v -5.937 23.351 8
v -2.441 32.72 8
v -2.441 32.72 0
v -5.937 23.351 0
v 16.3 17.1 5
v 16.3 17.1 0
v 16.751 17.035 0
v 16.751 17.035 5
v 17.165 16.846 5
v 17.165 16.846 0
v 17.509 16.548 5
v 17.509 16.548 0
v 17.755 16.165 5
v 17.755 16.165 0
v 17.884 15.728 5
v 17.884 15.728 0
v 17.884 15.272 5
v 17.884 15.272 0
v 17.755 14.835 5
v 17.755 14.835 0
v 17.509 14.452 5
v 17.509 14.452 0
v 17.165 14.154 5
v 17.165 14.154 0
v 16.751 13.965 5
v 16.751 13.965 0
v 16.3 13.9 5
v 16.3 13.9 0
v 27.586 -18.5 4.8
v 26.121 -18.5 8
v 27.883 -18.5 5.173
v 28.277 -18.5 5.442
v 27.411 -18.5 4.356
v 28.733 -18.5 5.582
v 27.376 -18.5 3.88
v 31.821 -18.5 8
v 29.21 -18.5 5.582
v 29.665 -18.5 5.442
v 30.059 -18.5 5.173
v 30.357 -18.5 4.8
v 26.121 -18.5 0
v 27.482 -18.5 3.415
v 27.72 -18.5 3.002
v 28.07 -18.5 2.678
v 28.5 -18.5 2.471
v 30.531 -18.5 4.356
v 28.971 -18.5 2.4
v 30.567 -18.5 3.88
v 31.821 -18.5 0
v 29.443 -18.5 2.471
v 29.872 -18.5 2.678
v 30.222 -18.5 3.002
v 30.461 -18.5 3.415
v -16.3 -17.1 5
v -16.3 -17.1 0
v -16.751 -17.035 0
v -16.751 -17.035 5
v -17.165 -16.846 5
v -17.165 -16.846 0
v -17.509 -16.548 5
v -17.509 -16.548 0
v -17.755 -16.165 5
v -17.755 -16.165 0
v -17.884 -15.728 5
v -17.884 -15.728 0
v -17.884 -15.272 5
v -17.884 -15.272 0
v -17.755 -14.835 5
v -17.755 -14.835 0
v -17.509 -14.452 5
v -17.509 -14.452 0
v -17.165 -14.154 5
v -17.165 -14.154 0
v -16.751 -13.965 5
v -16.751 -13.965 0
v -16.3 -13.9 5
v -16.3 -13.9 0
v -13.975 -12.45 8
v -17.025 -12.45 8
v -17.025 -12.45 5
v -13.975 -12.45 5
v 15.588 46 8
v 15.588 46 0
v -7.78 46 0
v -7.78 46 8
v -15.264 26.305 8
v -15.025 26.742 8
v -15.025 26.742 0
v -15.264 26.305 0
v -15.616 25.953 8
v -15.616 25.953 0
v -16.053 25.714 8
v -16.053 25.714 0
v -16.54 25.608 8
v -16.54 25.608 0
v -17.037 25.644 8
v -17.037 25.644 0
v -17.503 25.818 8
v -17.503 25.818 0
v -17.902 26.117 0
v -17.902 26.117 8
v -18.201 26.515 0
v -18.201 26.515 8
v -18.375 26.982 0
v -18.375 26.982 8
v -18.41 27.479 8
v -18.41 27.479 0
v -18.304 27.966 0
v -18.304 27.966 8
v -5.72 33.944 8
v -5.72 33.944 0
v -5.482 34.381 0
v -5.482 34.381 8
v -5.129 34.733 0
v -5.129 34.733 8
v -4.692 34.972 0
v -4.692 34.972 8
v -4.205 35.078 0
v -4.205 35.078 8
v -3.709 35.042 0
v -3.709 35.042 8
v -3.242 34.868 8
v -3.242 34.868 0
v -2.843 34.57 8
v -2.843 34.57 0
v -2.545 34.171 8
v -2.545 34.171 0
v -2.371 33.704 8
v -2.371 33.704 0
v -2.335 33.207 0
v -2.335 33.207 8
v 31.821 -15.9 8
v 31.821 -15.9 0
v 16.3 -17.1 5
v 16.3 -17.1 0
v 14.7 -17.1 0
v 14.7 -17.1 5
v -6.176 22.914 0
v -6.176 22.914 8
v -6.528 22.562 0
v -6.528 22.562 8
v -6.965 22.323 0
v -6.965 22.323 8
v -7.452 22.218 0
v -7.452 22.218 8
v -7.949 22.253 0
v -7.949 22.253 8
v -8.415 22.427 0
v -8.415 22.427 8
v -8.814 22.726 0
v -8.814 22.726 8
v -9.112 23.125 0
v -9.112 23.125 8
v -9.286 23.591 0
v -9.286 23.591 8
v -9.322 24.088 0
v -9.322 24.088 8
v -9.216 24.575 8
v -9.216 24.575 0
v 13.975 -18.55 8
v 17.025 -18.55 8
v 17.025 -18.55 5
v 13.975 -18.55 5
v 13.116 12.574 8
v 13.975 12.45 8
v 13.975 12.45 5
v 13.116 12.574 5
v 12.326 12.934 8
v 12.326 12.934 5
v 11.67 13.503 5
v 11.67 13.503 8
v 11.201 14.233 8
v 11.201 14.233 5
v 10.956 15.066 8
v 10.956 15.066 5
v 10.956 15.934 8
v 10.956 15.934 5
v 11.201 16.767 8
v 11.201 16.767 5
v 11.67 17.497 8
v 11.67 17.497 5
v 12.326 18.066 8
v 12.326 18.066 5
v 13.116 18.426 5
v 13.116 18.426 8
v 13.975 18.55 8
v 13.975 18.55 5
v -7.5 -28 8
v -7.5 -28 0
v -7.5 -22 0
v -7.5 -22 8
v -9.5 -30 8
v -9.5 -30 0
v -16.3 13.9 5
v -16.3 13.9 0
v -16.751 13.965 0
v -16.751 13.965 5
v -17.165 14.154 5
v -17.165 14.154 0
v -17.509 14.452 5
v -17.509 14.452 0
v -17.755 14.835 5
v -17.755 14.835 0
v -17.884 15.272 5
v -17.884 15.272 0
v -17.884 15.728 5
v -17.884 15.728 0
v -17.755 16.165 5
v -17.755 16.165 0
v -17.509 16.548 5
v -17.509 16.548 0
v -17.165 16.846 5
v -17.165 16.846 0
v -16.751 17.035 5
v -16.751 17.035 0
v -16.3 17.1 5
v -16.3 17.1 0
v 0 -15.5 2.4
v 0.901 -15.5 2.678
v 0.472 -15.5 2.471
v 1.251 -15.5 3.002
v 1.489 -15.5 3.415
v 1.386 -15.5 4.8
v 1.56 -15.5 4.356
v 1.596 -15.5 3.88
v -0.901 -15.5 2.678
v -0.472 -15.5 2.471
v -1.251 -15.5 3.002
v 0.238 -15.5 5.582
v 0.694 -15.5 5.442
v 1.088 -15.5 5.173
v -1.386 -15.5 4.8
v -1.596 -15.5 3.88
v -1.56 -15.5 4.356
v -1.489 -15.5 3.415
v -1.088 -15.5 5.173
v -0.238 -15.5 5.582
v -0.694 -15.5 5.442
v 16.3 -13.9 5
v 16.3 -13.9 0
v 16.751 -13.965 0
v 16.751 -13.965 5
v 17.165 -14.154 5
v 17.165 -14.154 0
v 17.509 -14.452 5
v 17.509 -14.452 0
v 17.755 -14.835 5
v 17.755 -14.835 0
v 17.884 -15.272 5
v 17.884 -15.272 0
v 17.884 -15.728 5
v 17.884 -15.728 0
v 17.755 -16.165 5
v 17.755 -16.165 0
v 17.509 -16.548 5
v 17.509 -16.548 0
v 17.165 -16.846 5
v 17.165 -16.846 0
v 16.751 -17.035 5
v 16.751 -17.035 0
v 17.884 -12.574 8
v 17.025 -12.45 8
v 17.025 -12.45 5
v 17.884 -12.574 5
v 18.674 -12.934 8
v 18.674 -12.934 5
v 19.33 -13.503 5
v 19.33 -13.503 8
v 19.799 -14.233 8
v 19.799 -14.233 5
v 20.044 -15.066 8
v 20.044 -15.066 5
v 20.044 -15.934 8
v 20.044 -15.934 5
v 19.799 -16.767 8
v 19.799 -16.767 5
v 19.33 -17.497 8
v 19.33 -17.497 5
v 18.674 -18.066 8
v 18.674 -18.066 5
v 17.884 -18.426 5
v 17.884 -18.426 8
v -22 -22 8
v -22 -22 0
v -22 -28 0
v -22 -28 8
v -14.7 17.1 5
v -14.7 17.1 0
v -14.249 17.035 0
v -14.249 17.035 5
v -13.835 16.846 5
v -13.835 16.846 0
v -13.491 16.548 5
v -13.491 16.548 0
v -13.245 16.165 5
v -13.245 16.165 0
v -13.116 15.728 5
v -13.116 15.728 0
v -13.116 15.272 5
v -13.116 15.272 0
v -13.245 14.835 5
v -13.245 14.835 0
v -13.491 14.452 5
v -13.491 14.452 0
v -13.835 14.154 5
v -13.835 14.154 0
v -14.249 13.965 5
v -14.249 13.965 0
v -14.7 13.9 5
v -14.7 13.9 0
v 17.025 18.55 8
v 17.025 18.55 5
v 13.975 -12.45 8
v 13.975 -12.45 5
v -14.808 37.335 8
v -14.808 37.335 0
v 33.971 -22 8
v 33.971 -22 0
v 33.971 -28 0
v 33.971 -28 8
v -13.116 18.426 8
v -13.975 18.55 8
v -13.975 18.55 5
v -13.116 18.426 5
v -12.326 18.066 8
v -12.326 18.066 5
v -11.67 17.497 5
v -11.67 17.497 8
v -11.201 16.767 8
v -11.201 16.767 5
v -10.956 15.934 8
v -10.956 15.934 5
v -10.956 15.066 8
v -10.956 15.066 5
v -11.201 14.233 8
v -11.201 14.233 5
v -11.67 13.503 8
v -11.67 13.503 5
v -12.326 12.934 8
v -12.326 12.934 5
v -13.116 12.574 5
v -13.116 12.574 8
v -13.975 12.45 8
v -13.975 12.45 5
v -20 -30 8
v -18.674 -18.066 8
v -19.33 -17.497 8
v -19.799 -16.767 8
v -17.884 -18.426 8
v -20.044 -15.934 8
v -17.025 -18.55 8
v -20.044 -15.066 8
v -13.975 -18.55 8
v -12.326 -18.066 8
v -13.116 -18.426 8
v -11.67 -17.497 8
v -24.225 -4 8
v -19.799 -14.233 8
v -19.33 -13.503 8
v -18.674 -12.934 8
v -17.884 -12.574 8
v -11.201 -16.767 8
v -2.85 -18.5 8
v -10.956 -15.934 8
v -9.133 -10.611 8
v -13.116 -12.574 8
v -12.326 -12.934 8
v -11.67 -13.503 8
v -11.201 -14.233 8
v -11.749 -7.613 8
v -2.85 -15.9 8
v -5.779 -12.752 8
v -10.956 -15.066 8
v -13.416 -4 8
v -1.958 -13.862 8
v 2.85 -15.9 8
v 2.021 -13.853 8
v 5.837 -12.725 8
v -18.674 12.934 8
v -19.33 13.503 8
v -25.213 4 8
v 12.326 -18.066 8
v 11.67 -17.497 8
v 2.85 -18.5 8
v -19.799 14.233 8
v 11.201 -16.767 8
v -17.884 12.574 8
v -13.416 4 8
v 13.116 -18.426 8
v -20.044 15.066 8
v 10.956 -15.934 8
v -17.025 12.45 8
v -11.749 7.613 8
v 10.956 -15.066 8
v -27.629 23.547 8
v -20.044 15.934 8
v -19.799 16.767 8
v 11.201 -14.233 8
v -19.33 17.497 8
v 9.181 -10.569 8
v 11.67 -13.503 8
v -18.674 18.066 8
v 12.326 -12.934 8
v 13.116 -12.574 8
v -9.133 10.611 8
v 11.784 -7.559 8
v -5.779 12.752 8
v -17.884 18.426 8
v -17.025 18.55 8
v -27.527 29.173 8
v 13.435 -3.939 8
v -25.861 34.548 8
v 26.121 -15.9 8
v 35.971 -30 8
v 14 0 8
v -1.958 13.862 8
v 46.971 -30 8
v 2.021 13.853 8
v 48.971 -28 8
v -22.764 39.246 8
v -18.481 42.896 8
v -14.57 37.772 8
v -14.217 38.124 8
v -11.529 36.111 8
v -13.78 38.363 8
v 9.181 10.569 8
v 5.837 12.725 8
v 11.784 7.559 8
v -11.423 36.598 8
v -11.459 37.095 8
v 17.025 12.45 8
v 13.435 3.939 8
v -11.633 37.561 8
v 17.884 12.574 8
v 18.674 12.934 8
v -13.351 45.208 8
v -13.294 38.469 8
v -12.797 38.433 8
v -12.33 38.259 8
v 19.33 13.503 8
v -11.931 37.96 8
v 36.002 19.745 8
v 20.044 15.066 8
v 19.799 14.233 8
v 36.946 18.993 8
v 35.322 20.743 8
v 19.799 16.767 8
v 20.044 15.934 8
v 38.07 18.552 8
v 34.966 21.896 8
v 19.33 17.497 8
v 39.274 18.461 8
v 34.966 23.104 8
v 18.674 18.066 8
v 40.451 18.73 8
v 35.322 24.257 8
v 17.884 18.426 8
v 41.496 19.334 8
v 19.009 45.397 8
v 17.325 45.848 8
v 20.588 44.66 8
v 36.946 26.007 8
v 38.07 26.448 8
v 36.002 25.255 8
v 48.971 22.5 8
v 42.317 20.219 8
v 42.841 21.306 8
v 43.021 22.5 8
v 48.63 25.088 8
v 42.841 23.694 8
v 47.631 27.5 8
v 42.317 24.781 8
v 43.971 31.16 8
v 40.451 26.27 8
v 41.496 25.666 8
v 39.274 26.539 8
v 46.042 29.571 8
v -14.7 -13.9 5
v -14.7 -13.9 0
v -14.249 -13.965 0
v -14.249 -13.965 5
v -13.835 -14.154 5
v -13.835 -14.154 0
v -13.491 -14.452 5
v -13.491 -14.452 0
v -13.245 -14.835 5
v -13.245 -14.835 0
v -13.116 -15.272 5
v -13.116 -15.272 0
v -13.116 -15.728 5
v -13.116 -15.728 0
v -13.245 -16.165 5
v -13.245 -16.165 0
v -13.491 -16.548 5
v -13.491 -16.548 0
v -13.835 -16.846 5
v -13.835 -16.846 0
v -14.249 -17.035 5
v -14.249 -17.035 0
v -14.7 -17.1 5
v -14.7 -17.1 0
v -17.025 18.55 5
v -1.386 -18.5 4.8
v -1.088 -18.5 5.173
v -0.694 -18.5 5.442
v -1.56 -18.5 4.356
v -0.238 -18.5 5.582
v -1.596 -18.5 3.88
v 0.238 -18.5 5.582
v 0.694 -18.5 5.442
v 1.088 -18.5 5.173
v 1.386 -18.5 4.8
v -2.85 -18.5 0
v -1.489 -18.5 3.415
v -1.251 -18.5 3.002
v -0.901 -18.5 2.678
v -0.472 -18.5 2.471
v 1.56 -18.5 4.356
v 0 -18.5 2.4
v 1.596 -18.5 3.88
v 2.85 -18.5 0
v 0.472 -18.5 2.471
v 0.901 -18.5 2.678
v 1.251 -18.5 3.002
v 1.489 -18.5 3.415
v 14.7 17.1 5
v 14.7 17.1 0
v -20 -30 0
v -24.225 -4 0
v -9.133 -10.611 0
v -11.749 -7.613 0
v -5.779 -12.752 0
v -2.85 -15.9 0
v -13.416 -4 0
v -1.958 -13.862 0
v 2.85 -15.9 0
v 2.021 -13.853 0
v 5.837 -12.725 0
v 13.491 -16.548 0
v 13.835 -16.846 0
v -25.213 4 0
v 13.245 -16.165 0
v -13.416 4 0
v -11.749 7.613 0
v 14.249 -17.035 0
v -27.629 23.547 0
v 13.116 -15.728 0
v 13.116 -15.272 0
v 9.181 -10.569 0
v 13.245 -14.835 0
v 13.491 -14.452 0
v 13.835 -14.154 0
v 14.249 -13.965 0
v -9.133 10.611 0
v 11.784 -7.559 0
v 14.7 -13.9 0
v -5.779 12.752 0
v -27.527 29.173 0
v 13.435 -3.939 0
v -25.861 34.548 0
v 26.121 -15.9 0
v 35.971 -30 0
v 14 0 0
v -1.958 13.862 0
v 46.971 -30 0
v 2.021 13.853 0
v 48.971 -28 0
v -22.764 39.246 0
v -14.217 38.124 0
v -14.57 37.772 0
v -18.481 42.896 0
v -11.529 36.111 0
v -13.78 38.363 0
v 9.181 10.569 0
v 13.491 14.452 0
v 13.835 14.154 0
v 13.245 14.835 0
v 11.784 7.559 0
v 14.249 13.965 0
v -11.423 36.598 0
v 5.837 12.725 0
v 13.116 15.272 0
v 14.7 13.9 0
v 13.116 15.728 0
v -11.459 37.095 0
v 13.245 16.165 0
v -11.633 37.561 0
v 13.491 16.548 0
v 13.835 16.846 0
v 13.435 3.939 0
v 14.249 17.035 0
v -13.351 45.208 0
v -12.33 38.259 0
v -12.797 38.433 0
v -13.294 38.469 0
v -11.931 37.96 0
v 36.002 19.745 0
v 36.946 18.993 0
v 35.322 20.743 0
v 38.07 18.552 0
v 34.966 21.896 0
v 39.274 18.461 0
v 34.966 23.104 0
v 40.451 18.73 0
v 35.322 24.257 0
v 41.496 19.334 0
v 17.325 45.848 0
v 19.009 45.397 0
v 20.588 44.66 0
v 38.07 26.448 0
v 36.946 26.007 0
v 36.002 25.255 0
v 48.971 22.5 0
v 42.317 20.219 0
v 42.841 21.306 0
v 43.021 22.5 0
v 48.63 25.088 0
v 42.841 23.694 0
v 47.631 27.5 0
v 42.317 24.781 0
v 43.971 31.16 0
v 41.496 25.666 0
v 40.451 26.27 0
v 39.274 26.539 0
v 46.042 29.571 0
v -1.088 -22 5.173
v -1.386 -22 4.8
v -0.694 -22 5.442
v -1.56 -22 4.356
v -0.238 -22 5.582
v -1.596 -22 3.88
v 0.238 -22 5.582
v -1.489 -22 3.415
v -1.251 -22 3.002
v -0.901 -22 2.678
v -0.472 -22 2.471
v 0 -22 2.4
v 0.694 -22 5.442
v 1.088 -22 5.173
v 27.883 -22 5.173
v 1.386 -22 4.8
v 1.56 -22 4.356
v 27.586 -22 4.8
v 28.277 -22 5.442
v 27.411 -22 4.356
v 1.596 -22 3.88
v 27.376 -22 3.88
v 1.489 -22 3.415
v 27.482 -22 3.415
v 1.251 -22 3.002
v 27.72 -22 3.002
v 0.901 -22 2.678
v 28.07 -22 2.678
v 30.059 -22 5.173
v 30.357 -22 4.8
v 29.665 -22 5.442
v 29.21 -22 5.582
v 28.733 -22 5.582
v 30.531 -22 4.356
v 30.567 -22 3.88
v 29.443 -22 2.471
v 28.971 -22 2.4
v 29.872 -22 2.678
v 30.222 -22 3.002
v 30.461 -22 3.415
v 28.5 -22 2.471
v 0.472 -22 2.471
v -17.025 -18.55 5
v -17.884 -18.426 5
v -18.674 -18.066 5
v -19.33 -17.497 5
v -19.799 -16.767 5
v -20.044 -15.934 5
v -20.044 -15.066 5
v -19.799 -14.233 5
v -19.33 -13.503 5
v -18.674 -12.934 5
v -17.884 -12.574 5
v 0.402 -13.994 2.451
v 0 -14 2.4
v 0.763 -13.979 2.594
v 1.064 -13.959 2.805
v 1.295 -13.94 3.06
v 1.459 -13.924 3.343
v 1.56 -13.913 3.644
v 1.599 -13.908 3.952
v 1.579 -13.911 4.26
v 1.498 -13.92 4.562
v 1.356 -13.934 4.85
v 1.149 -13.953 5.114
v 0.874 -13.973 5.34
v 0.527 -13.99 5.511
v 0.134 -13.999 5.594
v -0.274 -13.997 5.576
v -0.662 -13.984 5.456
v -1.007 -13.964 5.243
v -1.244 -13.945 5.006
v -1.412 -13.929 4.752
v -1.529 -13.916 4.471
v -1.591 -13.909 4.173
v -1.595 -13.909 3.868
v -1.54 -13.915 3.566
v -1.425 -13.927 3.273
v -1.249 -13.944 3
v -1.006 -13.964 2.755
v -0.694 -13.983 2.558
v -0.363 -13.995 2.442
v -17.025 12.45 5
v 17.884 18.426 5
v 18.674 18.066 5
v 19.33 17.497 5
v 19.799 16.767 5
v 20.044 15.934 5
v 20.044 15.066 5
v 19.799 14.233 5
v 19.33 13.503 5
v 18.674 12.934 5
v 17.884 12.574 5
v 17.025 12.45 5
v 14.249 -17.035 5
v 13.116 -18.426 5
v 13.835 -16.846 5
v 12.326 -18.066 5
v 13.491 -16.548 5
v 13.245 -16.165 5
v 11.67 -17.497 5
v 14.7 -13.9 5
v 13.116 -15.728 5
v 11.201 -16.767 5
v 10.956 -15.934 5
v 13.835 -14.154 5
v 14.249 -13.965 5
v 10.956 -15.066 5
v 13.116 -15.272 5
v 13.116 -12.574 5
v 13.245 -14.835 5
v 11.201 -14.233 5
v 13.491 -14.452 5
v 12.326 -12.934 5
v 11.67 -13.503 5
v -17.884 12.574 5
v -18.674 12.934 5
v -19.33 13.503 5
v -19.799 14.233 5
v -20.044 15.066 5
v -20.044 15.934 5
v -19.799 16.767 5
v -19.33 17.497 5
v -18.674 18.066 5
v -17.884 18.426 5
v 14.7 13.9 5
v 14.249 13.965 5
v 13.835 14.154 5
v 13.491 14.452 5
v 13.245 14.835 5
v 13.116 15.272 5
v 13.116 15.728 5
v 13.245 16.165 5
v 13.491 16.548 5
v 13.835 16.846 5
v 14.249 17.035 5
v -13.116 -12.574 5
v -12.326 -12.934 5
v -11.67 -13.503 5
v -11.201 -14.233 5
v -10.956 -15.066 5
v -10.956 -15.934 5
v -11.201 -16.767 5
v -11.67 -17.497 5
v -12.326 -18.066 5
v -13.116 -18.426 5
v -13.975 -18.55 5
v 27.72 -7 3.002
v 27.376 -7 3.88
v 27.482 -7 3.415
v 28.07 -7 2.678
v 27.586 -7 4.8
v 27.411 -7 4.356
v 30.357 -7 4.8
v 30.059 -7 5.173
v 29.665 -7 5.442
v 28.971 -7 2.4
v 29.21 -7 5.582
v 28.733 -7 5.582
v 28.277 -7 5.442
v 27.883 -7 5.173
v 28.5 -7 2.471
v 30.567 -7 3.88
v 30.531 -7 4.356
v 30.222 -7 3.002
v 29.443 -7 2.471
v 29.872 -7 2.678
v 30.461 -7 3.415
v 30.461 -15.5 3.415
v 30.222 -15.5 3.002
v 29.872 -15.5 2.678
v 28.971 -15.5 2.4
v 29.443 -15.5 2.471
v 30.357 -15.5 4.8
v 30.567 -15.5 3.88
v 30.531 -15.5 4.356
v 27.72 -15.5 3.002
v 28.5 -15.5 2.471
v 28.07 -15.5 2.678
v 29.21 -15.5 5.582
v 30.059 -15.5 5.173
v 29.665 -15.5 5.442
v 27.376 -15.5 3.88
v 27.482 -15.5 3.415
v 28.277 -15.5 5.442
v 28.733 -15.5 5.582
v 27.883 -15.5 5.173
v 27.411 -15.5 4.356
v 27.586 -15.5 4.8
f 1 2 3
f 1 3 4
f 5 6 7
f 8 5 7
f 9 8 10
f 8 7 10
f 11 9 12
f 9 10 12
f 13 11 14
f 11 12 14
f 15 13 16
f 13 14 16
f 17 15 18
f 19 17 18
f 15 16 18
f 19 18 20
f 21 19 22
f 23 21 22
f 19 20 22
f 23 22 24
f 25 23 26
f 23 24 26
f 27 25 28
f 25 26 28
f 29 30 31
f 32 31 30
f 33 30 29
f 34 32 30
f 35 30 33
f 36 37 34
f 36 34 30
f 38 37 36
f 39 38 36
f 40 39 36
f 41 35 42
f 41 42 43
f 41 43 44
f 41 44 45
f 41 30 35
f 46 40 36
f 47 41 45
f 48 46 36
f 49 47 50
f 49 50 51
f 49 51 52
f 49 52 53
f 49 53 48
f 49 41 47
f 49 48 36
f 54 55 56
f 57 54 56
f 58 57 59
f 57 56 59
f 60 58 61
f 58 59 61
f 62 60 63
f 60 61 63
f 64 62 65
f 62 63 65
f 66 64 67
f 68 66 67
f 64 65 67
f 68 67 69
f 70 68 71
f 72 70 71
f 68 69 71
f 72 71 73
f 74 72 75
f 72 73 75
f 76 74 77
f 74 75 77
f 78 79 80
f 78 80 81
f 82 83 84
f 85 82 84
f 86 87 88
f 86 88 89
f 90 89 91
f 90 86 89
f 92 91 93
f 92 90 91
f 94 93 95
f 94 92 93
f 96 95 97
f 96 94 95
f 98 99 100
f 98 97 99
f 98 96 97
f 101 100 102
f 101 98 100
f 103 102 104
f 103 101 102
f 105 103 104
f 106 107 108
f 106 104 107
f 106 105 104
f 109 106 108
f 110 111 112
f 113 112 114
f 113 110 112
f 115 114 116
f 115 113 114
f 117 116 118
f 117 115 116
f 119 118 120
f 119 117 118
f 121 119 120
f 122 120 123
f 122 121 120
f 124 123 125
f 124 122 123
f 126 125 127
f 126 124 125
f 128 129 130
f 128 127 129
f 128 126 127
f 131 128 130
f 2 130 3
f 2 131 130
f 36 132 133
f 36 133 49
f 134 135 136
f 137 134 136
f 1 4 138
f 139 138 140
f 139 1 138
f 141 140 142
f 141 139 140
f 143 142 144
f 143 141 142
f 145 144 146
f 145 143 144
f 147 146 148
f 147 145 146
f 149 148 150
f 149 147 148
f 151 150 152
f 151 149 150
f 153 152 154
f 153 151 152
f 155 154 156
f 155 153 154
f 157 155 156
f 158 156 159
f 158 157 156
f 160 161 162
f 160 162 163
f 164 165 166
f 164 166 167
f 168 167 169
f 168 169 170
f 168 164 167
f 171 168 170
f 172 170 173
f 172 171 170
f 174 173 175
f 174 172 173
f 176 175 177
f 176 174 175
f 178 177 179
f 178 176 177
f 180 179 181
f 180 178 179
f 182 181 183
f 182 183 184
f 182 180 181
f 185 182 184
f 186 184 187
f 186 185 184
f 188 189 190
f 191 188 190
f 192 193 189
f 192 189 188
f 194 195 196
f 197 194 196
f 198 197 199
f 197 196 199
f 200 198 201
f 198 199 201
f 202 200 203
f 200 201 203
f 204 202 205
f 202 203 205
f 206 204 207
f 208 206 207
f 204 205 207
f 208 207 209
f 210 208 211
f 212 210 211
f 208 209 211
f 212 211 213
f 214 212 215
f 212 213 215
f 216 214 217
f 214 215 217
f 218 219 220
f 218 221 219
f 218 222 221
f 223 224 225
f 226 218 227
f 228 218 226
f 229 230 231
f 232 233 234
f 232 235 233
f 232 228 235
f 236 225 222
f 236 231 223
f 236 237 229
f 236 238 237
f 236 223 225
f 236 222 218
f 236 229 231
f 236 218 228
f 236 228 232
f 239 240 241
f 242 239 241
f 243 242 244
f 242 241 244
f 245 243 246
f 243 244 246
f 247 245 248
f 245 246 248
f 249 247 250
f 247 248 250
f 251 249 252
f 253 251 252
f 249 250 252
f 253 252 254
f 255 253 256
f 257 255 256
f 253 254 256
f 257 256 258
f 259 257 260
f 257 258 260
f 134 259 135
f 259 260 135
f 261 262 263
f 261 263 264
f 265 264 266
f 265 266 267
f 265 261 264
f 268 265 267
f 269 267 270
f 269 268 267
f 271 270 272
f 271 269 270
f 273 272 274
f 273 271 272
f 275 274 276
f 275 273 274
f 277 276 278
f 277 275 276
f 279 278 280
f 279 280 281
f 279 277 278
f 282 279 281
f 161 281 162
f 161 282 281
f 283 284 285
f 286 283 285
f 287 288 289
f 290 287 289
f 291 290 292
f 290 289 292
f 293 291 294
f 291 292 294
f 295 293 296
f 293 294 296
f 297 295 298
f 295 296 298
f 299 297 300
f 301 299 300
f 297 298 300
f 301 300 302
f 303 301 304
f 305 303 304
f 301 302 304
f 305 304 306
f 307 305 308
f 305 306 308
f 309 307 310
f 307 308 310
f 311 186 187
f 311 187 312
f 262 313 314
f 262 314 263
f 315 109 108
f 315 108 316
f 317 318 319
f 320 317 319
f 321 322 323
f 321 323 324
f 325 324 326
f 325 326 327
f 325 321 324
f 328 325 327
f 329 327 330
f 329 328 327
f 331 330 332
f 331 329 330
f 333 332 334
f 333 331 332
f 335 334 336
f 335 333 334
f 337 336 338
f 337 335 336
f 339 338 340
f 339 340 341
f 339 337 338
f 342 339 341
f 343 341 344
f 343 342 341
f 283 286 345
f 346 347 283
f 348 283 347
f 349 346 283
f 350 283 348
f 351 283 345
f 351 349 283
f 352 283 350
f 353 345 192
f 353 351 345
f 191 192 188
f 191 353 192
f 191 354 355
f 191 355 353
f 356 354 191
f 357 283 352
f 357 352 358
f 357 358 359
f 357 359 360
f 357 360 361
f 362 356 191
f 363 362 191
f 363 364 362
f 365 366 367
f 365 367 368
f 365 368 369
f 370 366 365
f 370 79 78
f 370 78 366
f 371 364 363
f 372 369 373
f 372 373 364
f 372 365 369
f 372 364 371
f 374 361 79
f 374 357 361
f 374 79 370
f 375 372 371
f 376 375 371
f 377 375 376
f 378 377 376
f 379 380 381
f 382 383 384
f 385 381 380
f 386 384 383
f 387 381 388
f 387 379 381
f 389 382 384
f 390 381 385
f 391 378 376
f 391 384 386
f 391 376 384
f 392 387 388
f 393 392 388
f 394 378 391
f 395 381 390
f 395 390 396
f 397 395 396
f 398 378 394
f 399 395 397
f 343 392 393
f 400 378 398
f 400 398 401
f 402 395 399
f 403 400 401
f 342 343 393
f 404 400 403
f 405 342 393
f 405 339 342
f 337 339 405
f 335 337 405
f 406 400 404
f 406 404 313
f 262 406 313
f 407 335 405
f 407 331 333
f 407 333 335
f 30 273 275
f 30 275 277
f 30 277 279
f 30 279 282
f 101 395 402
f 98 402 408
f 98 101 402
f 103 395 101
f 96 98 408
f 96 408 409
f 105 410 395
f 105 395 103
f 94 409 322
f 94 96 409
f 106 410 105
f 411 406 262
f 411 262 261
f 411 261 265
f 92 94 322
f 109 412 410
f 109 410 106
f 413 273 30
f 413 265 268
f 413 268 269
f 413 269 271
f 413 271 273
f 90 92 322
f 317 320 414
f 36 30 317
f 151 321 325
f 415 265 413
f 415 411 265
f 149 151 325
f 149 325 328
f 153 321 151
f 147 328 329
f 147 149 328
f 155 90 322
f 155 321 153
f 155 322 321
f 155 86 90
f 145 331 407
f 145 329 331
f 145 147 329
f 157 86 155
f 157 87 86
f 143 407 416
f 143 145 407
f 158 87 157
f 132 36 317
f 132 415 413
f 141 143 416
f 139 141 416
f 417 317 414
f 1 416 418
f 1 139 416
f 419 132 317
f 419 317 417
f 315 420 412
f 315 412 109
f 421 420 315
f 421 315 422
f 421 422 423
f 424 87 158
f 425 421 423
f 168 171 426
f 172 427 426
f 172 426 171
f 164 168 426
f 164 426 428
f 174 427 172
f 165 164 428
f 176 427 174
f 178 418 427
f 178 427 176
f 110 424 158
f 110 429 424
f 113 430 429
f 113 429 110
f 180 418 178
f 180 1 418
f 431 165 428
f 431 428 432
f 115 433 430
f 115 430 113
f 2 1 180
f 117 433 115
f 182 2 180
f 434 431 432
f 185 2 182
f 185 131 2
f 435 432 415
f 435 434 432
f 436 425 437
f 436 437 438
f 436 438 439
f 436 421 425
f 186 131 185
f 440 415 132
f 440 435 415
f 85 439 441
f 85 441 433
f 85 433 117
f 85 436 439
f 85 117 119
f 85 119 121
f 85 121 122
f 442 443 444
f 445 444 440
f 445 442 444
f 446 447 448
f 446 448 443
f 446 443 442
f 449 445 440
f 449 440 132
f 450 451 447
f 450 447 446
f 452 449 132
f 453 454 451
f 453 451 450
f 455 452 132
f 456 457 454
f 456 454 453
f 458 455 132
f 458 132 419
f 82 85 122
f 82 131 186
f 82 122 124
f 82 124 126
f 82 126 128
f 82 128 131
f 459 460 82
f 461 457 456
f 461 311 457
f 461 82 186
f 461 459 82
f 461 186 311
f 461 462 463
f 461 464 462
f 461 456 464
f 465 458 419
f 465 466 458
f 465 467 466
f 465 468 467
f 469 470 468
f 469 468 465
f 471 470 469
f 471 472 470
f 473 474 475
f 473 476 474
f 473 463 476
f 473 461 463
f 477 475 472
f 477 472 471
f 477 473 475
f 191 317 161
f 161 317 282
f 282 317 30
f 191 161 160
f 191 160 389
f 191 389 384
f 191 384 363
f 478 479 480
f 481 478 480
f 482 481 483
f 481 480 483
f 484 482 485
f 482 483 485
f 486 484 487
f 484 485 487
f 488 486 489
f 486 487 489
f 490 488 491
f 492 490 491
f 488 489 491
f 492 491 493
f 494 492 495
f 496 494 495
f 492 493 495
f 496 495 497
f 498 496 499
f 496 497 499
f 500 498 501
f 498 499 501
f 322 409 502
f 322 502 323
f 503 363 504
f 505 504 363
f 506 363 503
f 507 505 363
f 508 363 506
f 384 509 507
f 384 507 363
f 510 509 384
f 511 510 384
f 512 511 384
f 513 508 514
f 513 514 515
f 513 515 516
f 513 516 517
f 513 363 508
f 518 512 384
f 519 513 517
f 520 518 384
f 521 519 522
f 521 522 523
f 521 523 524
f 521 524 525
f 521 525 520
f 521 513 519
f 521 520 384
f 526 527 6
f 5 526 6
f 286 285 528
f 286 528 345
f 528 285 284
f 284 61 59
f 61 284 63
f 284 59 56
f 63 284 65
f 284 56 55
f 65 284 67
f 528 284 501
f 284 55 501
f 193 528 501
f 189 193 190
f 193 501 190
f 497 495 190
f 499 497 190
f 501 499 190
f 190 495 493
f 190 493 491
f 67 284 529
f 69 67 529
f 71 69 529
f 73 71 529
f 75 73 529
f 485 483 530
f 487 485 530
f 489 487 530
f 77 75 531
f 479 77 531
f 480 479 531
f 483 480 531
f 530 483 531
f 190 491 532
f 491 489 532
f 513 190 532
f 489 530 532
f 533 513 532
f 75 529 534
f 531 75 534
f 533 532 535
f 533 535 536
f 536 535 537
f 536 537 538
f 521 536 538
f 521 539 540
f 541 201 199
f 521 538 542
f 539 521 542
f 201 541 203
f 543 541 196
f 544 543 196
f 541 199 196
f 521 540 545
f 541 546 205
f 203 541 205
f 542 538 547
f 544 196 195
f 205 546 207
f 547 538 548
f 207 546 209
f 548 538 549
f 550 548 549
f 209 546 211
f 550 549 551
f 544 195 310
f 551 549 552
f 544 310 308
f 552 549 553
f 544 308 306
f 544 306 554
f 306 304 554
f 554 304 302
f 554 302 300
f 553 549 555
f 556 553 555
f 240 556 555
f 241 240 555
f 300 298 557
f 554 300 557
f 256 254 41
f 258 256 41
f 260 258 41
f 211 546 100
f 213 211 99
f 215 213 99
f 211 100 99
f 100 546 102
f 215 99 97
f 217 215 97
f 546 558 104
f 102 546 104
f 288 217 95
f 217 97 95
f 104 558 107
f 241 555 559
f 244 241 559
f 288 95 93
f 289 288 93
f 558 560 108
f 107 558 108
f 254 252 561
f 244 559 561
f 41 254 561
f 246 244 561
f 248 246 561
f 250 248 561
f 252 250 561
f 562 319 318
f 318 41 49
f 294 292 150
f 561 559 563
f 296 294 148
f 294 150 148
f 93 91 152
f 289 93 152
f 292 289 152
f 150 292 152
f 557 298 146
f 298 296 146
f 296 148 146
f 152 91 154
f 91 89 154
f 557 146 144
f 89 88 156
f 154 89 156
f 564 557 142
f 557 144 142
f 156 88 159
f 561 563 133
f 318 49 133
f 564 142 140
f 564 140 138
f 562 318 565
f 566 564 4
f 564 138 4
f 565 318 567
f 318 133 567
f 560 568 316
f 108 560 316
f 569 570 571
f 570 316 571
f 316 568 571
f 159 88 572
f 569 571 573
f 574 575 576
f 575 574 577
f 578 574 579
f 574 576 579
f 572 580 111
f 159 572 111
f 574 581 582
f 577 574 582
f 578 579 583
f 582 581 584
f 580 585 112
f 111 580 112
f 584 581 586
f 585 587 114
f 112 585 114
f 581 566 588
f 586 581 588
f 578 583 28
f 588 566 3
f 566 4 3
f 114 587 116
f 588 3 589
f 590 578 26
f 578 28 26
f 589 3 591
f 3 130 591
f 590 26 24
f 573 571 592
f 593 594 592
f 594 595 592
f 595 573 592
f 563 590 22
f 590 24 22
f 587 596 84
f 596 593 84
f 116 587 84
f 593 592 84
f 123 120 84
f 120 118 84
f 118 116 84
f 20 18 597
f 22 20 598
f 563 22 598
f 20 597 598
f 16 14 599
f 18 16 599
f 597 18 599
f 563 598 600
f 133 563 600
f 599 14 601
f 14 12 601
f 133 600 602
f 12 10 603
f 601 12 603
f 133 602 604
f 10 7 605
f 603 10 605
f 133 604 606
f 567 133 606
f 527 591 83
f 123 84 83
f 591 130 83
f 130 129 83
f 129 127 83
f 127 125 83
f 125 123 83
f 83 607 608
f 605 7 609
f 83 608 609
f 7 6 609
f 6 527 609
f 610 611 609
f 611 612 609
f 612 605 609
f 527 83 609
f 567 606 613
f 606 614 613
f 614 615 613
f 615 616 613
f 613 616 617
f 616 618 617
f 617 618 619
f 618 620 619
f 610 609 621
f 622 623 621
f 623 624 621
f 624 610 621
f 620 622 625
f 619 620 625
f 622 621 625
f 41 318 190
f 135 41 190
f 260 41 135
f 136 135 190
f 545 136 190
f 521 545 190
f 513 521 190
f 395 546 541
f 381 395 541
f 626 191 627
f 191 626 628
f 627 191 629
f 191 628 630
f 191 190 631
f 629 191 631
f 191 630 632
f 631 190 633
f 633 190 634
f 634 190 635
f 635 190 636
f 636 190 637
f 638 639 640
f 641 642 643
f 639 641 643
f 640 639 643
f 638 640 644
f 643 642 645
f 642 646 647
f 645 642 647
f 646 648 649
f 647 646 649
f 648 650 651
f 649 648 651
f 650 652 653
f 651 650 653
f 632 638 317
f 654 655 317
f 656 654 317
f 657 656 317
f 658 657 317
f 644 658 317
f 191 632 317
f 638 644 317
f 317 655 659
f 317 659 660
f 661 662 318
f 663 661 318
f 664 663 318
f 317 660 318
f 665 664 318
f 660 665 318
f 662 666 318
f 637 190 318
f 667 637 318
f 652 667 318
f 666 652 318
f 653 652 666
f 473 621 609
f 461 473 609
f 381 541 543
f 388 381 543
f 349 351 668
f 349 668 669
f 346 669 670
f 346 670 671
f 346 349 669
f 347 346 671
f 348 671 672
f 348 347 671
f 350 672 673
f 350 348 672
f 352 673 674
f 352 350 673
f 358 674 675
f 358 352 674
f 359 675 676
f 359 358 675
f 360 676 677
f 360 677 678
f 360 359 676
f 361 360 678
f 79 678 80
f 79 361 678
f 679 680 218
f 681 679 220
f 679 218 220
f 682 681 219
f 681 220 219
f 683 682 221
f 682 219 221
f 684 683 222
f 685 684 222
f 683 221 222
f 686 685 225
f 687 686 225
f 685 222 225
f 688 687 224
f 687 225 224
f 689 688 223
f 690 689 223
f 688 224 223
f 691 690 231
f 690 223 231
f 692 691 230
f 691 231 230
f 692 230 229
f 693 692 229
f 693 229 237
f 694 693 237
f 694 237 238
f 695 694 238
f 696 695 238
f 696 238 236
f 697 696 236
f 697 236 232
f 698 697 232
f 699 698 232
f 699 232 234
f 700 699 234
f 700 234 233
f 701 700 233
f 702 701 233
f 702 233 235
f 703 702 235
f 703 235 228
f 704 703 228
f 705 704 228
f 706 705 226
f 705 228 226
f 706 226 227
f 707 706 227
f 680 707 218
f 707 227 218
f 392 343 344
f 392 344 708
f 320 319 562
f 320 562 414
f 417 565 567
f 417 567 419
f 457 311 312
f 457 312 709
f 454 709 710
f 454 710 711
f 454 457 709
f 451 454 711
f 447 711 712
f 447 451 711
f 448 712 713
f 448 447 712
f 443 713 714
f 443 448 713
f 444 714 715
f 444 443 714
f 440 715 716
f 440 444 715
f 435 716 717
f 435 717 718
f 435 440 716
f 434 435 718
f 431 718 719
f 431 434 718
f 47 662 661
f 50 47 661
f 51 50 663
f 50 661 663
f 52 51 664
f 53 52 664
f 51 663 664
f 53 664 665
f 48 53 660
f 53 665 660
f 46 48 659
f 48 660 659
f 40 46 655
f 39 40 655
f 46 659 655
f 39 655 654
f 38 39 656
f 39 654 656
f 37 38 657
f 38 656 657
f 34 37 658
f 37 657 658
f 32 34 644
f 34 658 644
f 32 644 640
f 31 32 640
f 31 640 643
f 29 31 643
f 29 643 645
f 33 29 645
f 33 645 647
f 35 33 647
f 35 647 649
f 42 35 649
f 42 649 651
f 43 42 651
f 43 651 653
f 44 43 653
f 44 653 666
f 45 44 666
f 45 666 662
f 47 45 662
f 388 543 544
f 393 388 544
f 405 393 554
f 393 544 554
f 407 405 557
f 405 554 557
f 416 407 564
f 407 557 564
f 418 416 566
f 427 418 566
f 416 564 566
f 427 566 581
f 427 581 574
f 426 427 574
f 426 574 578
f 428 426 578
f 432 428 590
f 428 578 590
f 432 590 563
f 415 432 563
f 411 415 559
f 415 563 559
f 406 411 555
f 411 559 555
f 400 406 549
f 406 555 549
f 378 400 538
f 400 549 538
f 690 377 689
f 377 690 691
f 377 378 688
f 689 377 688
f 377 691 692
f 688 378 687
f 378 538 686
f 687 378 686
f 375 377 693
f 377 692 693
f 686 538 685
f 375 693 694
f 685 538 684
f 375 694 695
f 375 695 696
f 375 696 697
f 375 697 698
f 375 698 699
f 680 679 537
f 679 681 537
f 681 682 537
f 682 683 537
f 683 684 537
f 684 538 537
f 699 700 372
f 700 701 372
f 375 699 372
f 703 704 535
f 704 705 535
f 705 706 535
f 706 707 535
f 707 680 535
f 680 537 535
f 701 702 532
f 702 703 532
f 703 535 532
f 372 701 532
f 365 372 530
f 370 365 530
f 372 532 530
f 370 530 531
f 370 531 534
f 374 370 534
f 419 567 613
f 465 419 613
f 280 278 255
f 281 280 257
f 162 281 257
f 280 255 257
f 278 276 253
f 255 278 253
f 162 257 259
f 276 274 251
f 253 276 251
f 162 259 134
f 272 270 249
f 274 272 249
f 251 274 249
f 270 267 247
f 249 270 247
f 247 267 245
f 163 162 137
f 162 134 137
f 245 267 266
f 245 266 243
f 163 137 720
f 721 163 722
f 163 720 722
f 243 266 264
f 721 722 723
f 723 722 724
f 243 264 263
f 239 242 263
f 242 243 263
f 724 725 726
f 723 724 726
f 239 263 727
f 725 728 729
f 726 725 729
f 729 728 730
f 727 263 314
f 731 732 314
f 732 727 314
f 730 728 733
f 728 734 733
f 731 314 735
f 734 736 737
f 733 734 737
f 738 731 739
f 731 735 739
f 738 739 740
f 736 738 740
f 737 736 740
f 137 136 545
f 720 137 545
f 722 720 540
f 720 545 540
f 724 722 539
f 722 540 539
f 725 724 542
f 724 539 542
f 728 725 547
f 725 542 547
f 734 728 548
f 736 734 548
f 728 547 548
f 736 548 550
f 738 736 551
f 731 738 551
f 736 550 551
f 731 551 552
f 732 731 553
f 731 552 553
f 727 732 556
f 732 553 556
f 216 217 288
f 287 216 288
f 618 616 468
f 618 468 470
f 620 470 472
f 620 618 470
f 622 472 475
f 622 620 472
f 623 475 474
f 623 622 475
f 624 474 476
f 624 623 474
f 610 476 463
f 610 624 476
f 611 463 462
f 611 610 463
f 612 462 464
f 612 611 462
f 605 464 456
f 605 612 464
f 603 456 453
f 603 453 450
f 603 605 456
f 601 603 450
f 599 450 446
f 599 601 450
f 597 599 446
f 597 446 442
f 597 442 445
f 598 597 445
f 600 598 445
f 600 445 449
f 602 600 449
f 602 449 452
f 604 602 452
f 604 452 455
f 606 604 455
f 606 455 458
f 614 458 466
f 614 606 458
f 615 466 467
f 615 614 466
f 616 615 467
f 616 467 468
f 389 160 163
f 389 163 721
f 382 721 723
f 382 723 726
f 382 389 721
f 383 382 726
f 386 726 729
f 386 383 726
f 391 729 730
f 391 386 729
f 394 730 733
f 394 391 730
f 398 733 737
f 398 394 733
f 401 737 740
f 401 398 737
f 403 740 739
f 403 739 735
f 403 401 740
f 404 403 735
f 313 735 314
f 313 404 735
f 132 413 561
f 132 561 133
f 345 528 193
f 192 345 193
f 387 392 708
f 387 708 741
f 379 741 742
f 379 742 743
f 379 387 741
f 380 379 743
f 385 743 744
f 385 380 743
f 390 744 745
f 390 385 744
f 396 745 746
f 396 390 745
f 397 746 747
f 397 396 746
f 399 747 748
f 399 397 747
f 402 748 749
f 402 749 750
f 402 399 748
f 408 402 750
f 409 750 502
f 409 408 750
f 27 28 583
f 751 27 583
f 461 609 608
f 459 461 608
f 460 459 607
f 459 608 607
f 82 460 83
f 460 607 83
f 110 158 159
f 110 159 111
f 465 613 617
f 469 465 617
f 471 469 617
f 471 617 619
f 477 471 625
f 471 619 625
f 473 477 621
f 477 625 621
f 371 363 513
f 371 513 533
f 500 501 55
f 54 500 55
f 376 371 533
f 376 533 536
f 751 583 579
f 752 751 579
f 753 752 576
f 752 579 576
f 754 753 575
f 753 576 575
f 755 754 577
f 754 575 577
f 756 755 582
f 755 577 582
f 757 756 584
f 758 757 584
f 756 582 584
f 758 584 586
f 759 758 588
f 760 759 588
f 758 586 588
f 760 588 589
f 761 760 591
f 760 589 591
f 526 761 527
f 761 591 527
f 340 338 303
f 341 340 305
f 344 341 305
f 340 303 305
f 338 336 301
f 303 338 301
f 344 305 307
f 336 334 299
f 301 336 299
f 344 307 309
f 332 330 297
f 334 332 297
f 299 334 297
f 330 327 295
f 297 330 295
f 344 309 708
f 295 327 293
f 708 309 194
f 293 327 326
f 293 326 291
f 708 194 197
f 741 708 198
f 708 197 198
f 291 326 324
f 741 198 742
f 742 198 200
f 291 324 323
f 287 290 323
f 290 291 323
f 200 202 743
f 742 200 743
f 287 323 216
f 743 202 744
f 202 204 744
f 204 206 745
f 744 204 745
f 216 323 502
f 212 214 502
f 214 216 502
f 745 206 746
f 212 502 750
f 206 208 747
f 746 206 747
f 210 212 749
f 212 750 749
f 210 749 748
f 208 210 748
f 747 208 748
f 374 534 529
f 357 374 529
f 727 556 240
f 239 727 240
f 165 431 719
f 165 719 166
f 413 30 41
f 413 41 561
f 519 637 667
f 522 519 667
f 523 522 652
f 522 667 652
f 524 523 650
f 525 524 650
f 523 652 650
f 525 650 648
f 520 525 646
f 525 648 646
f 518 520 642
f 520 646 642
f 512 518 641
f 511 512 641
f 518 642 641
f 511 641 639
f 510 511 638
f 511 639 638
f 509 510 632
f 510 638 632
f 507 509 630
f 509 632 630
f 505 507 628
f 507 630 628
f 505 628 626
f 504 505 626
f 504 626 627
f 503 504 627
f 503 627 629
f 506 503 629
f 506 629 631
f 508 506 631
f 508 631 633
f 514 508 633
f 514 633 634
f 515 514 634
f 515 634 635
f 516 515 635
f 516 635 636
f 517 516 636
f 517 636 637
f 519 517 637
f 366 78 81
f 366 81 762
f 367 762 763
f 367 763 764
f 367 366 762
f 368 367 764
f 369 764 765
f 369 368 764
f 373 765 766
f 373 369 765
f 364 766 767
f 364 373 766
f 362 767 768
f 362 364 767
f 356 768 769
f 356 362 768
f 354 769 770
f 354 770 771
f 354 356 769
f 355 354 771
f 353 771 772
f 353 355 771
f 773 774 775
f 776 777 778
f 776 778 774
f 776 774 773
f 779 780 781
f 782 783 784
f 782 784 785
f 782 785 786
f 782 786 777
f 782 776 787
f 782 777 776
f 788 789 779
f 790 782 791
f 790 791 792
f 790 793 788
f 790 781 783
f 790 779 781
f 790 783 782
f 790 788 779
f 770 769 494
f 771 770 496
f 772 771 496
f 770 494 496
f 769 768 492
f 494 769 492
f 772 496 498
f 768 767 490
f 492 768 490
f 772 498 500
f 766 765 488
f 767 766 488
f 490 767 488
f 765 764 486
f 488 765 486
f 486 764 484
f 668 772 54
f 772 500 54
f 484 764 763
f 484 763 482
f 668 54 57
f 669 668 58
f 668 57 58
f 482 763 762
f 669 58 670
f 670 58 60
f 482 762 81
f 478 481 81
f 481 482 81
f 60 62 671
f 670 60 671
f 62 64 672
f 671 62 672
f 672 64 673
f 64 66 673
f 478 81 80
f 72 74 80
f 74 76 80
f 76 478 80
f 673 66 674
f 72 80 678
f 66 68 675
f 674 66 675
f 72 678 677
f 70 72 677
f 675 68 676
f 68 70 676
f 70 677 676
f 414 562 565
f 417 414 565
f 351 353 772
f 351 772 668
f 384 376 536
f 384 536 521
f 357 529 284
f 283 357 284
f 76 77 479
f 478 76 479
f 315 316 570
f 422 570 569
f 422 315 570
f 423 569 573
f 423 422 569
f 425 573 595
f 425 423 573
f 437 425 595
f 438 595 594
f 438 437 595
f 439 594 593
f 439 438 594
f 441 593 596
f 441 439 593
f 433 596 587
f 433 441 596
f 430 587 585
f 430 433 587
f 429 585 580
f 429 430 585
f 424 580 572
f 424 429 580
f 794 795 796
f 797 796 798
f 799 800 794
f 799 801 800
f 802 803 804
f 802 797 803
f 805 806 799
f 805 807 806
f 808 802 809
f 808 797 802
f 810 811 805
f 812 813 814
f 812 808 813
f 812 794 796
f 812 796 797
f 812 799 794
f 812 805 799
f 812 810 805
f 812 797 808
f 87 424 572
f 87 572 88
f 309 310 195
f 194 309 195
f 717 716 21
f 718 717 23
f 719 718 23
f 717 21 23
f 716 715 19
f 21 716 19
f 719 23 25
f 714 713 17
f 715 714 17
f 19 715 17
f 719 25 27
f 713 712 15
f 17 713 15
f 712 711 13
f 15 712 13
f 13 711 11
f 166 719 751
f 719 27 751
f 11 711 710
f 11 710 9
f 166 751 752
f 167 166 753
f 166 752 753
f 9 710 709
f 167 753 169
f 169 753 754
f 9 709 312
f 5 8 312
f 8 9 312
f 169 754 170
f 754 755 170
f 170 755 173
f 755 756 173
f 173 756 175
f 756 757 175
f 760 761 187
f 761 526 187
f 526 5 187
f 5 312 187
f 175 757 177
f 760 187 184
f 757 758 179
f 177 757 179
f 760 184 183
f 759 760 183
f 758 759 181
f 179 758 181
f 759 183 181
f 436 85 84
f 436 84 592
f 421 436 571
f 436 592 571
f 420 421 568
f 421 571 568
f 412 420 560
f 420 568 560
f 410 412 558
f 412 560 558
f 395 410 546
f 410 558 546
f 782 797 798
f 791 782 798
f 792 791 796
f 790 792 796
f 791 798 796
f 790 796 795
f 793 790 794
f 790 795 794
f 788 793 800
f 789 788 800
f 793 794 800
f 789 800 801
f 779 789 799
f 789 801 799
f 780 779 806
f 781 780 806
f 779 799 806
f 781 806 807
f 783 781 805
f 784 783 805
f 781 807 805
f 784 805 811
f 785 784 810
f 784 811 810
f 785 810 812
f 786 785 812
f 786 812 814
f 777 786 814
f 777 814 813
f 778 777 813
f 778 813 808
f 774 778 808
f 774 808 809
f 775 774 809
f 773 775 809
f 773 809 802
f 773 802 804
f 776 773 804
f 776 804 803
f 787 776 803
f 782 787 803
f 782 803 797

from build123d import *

# Parameters (mm, degrees)
SKETCH_3_R          = 4.05
SKETCH_3_W          = 6.1
SKETCH_3_H          = 3
EXTRUDE_1_DEPTH     = 8
CUT_EXTRUDE_2_DEPTH = 3
SKETCH_6_R          = 1.6
CUT_EXTRUDE_3_DEPTH = 15
SKETCH_7_R          = 4.05
CUT_EXTRUDE_4_DEPTH = 68.662198854
CHAMFER_1_SIZE      = 2
EXTRUDE_2_DEPTH     = 8


with BuildPart() as part:
    # 草图3 → 凸台-拉伸1 (new body)
    with BuildSketch(Plane.XY):
        with BuildLine():
            Line((43.971143614, 31.160253781), (20.588455044, 44.660256921))
            ThreePointArc((20.588455044, 44.660256921), (18.176645298, 45.659261336), (15.5884546, 46.000003139))
            Line((15.5884546, 46.000003139), (-7.779942733, 46.000003139))
            ThreePointArc((-7.779942733, 46.000003139), (-22.764282879, 39.246495142), (-27.628936924, 23.546958177))
            Line((-27.628936924, 23.546958177), (-25.213219189, 4))
            Line((-25.213219189, 4), (-13.416407865, 4))
            ThreePointArc((-13.416407865, 4), (14, 0), (-13.416407865, -4))
            Line((-13.416407865, -4), (-24.224536362, -4))
            Line((-24.224536362, -4), (-22, -22))
            Line((-22, -22), (-22, -30))
            Line((-22, -30), (-7.5, -30))
            Line((-7.5, -30), (-7.5, -22))
            Line((-7.5, -22), (33.97114317, -22))
            Line((33.97114317, -22), (33.97114317, -30))
            Line((33.97114317, -30), (48.97114317, -30))
            Line((48.97114317, -30), (48.97114317, 22.5))
            ThreePointArc((48.97114317, 22.5), (47.631397336, 27.499999778), (43.971143614, 31.160253781))
        make_face()
        with Locations((38.97114317, 22.5)):
            Circle(SKETCH_3_R, mode=Mode.SUBTRACT)
        with Locations((0, -17)):
            Rectangle(SKETCH_3_W, SKETCH_3_H, mode=Mode.SUBTRACT)
        with BuildLine():
            Line((-16.3, 17.1), (-14.7, 17.1))
            ThreePointArc((-14.7, 17.1), (-13.1, 15.5), (-14.7, 13.9))
            Line((-14.7, 13.9), (-16.3, 13.9))
            ThreePointArc((-16.3, 13.9), (-17.9, 15.5), (-16.3, 17.1))
        make_face(mode=Mode.SUBTRACT)
        with BuildLine():
            Line((14.7, 17.1), (16.3, 17.1))
            ThreePointArc((16.3, 17.1), (17.9, 15.5), (16.3, 13.9))
            Line((16.3, 13.9), (14.7, 13.9))
            ThreePointArc((14.7, 13.9), (13.1, 15.5), (14.7, 17.1))
        make_face(mode=Mode.SUBTRACT)
        with BuildLine():
            Line((14.7, -13.9), (16.3, -13.9))
            ThreePointArc((16.3, -13.9), (17.9, -15.5), (16.3, -17.1))
            Line((16.3, -17.1), (14.7, -17.1))
            ThreePointArc((14.7, -17.1), (13.1, -15.5), (14.7, -13.9))
        make_face(mode=Mode.SUBTRACT)
        with BuildLine():
            Line((-16.3, -13.9), (-14.7, -13.9))
            ThreePointArc((-14.7, -13.9), (-13.1, -15.5), (-14.7, -17.1))
            Line((-14.7, -17.1), (-16.3, -17.1))
            ThreePointArc((-16.3, -17.1), (-17.9, -15.5), (-16.3, -13.9))
        make_face(mode=Mode.SUBTRACT)
        with Locations((28.97114317, -17)):
            Rectangle(SKETCH_3_W, SKETCH_3_H, mode=Mode.SUBTRACT)
    extrude(amount=EXTRUDE_1_DEPTH)

    # 草图5 → 切除-拉伸2 (cut)
    with BuildSketch(Plane.XY.offset(8)):
        with BuildLine():
            Line((-17.025, 18.55), (-13.975, 18.55))
            ThreePointArc((-13.975, 18.55), (-10.925, 15.5), (-13.975, 12.45))
            Line((-13.975, 12.45), (-17.025, 12.45))
            ThreePointArc((-17.025, 12.45), (-20.075, 15.5), (-17.025, 18.55))
        make_face()
        with BuildLine():
            Line((13.975, 18.55), (17.025, 18.55))
            ThreePointArc((17.025, 18.55), (20.075, 15.5), (17.025, 12.45))
            Line((17.025, 12.45), (13.975, 12.45))
            ThreePointArc((13.975, 12.45), (10.925, 15.5), (13.975, 18.55))
        make_face()
        with BuildLine():
            Line((13.975, -12.45), (17.025, -12.45))
            ThreePointArc((17.025, -12.45), (20.075, -15.5), (17.025, -18.55))
            Line((17.025, -18.55), (13.975, -18.55))
            ThreePointArc((13.975, -18.55), (10.925, -15.5), (13.975, -12.45))
        make_face()
        with BuildLine():
            Line((-17.025, -12.45), (-13.975, -12.45))
            ThreePointArc((-13.975, -12.45), (-10.925, -15.5), (-13.975, -18.55))
            Line((-13.975, -18.55), (-17.025, -18.55))
            ThreePointArc((-17.025, -18.55), (-20.075, -15.5), (-17.025, -12.45))
        make_face()
    extrude(amount=-CUT_EXTRUDE_2_DEPTH, mode=Mode.SUBTRACT)

    # 草图6 → 切除-拉伸3 (cut)
    with BuildSketch(Plane.XZ.offset(22)):
        with Locations(Location((0, 4, 0), (0, 0, 270))):
            Circle(SKETCH_6_R)
        with Locations(Location((28.97114317, 4, 0), (0, 0, 270))):
            Circle(SKETCH_6_R)
    extrude(amount=-CUT_EXTRUDE_3_DEPTH, mode=Mode.SUBTRACT)

    # 草图7 → 切除-拉伸4 (cut, through all)
    with BuildSketch(Plane.XY.offset(8)):
        with Locations((38.97114317, 22.5)):
            Circle(SKETCH_7_R)
        with BuildLine():
            Line((-9.216024373, 24.574816528), (-5.72042198, 33.943955438))
            ThreePointArc((-5.72042198, 33.943955438), (-3.469092252, 34.971824328), (-2.441223361, 32.7204946))
            Line((-2.441223361, 32.7204946), (-5.936825754, 23.35135569))
            ThreePointArc((-5.936825754, 23.35135569), (-8.188156015, 22.323485372), (-9.216024373, 24.574816528))
        make_face()
        with BuildLine():
            Line((-18.304089115, 27.965550849), (-14.808486722, 37.334689759))
            ThreePointArc((-14.808486722, 37.334689759), (-12.557156994, 38.362558649), (-11.529288104, 36.111228921))
            Line((-11.529288104, 36.111228921), (-15.024890497, 26.742090011))
            ThreePointArc((-15.024890497, 26.742090011), (-17.276220757, 25.714219693), (-18.304089115, 27.965550849))
        make_face()
    extrude(amount=-CUT_EXTRUDE_4_DEPTH, mode=Mode.SUBTRACT)

    # 倒角1
    chamfer_1_edges = [part.edges().sort_by_distance(p)[0] for p in [
        (48.97114317, -30, 4),
        (33.97114317, -30, 4),
        (-7.5, -30, 4),
        (-22, -30, 4),
    ]]
    chamfer(chamfer_1_edges, length=CHAMFER_1_SIZE)

    # 草图8 → 凸台-拉伸2 (add)
    with BuildSketch(Plane.XY.offset(8)):
        Polygon((25.92114317, -15.5), (25.92114317, -18.5), (26.12114317, -18.5), (26.12114317, -15.9), (31.82114317, -15.9), (31.82114317, -18.5), (32.02114317, -18.5), (32.02114317, -15.5), align=None)
        Polygon((-2.85, -18.5), (-2.85, -15.9), (2.85, -15.9), (2.85, -18.5), (3.05, -18.5), (3.05, -15.5), (-3.05, -15.5), (-3.05, -18.5), align=None)
    extrude(amount=-EXTRUDE_2_DEPTH)


solid = part.part
